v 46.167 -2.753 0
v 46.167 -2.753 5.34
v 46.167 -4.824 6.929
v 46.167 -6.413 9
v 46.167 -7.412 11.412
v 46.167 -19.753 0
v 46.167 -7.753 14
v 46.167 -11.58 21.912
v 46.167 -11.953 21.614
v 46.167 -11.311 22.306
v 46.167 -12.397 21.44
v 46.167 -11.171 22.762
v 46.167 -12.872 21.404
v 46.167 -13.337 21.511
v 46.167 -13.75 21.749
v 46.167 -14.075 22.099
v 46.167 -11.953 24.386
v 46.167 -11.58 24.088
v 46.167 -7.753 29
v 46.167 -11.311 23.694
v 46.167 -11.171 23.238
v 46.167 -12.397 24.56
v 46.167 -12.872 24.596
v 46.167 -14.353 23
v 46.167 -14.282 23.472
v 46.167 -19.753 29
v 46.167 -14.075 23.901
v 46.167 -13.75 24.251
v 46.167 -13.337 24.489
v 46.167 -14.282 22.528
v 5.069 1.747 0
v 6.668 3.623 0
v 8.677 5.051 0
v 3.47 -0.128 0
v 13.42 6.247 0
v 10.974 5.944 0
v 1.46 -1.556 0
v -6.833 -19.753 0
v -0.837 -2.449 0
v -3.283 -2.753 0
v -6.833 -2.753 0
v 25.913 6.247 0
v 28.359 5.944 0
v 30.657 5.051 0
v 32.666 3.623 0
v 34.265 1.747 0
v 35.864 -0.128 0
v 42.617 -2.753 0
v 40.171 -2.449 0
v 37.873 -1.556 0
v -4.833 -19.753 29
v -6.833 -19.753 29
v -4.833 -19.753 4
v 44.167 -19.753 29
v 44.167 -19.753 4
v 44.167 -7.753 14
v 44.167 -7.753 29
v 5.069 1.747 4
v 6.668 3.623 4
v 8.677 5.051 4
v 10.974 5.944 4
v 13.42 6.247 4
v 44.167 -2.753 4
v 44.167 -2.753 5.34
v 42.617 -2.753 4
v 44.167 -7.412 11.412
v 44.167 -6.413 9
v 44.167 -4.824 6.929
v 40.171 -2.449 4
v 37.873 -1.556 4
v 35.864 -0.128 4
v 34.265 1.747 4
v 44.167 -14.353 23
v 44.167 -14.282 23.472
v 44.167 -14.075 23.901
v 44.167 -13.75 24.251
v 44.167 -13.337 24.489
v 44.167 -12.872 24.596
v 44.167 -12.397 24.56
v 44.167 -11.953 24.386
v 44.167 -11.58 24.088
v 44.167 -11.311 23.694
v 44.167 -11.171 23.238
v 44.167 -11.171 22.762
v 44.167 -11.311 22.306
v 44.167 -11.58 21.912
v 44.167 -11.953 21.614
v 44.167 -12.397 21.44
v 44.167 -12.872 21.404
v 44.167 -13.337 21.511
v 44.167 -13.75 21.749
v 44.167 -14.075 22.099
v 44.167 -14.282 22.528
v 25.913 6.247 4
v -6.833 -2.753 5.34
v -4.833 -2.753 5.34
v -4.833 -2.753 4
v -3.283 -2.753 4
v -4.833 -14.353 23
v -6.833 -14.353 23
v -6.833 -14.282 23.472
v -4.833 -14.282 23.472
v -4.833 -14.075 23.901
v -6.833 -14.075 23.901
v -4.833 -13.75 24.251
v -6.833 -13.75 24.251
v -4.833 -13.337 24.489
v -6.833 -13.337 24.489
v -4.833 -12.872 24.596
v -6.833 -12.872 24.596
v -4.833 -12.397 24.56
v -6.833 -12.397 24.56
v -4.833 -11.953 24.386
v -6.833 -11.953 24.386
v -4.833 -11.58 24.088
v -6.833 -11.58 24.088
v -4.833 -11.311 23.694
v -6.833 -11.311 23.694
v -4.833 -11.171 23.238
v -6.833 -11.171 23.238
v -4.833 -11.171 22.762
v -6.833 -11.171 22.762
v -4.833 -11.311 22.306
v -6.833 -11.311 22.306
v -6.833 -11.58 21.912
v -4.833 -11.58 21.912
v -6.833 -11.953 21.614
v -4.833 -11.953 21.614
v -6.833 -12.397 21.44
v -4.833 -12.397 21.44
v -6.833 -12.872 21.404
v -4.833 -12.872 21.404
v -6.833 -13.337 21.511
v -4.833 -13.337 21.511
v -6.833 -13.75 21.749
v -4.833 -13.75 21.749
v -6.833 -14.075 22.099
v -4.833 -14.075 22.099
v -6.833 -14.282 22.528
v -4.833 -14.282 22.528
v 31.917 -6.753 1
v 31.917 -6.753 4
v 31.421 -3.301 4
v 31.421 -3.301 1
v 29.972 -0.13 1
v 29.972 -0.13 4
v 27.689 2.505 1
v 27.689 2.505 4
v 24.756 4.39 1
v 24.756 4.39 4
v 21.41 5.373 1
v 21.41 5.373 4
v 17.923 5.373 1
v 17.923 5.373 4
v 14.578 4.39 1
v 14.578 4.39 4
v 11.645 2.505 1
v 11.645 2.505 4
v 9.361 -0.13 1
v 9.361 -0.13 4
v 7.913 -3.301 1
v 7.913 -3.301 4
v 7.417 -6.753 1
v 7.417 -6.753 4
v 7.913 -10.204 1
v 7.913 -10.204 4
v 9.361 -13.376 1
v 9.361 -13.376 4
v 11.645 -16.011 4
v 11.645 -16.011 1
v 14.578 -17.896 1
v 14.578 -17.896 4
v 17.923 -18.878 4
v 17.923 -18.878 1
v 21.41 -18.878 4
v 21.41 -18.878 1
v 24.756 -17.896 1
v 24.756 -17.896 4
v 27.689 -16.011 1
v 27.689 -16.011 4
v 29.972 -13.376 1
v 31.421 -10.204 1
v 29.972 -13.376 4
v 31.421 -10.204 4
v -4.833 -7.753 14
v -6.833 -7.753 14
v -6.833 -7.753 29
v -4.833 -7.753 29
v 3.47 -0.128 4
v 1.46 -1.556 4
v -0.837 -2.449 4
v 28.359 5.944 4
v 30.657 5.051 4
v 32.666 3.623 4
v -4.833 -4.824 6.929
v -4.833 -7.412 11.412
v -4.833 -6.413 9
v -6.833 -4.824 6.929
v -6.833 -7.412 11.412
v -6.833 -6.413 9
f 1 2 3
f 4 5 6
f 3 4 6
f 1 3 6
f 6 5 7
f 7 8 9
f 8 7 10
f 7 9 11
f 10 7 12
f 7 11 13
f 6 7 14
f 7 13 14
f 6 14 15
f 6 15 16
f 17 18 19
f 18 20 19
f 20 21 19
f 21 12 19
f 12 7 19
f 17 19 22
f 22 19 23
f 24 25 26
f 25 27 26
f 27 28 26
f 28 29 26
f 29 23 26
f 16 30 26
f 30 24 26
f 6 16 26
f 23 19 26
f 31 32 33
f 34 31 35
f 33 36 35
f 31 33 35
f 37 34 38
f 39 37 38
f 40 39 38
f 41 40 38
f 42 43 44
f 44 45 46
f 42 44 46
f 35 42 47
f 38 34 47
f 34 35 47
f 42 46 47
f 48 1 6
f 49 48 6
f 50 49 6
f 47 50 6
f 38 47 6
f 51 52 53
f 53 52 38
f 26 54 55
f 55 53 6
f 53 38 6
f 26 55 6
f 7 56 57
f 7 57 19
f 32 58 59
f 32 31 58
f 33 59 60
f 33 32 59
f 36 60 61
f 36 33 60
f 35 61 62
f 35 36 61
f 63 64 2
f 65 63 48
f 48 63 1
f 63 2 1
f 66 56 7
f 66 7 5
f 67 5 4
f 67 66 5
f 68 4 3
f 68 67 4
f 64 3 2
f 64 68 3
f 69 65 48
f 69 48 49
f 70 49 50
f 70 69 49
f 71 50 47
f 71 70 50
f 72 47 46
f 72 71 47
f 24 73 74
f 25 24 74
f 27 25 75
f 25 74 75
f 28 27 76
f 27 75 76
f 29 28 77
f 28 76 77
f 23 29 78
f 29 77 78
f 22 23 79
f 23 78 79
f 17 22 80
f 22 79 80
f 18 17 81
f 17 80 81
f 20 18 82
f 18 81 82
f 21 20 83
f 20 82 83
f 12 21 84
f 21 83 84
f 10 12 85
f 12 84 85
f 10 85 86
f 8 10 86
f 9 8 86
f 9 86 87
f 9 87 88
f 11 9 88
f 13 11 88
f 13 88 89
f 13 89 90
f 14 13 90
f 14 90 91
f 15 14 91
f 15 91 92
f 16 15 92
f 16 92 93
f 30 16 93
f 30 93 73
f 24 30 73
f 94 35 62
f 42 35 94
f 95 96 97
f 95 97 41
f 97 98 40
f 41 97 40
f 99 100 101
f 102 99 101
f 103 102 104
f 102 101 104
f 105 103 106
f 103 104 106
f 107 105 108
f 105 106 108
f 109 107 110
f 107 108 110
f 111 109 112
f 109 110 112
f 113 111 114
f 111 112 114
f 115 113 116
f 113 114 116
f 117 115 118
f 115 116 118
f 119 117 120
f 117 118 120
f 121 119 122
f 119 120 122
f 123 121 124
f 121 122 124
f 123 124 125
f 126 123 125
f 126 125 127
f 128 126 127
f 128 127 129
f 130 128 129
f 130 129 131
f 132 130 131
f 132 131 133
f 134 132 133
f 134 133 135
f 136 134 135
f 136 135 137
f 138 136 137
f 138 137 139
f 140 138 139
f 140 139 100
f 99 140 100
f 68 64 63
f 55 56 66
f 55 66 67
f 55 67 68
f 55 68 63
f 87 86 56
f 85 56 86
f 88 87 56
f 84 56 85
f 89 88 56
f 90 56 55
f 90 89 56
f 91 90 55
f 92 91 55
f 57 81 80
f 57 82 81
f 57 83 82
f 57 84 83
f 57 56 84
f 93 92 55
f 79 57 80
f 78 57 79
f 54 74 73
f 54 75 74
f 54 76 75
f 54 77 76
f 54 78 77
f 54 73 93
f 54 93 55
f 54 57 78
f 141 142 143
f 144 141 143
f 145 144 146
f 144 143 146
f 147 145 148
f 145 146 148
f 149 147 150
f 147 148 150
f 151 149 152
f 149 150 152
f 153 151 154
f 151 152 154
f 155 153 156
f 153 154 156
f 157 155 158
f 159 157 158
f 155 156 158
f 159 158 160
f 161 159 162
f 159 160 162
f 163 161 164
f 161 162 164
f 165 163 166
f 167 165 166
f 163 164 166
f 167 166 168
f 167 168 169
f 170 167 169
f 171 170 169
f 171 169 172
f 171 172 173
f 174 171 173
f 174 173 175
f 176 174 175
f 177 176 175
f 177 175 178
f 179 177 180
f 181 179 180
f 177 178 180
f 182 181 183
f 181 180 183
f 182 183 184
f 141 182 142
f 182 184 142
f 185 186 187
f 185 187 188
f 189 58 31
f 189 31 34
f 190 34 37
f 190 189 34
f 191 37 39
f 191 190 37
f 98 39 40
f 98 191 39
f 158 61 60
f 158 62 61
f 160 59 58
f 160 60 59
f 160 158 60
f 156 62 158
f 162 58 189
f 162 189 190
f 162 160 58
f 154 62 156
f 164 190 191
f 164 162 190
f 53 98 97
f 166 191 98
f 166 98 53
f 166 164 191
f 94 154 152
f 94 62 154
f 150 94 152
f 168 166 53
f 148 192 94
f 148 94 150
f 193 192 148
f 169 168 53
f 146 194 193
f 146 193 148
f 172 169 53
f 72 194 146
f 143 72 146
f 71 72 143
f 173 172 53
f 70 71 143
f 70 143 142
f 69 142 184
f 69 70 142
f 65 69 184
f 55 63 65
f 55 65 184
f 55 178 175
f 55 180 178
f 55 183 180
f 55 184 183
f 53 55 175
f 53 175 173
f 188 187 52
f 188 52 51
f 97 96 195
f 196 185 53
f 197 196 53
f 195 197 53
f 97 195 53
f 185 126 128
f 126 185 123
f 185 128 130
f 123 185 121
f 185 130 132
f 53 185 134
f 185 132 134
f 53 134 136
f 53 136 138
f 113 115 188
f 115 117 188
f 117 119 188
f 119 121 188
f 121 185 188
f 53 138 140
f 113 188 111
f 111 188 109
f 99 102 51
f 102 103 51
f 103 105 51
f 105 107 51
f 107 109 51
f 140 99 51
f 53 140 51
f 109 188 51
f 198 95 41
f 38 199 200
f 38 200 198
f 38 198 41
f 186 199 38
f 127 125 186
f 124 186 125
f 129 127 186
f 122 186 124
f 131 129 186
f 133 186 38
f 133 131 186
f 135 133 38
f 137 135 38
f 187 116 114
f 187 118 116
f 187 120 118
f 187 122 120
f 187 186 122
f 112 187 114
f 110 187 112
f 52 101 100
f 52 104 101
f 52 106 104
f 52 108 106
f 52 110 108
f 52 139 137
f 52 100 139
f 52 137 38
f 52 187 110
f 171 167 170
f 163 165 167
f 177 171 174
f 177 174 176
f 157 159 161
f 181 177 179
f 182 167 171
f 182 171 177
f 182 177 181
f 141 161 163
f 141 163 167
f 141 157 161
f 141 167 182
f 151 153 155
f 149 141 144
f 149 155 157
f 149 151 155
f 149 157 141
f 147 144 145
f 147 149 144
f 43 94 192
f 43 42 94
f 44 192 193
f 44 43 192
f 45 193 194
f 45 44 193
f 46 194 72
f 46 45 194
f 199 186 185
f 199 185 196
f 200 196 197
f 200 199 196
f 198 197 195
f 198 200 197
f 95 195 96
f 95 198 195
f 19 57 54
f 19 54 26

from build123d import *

# Parameters (mm, degrees)
SKETCH1_W           = 53
SKETCH1_H           = 26
BOSS_EXTRUDE2_DEPTH = 4
SKETCH3_R           = 12.25
CUT_EXTRUDE2_DEPTH  = 3
CUT_EXTRUDE3_REACH  = 52.374
SKETCH4_W           = 13.5
SKETCH4_H           = 9
FILLET1_R           = 10
FILLET2_R           = 10
SKETCH5_W           = 2
SKETCH5_H           = 12
BOSS_EXTRUDE3_DEPTH = 25
SKETCH6_R           = 1.6
CUT_EXTRUDE4_DEPTH  = 64.562322282
FILLET3_R           = 10


with BuildPart() as part:
    # Sketch1 → Boss-Extrude2 (new body)
    with BuildSketch(Plane.XY):
        with Locations((19.666835682, -6.752691308)):
            Rectangle(SKETCH1_W, SKETCH1_H)
    extrude(amount=BOSS_EXTRUDE2_DEPTH)

    # Sketch3 → Cut-Extrude2 (cut)
    with BuildSketch(Plane.XY.offset(4)):
        with Locations((19.666835682, -6.752691308)):
            Circle(SKETCH3_R)
    extrude(amount=-CUT_EXTRUDE2_DEPTH, mode=Mode.SUBTRACT)

    # Sketch4 → Cut-Extrude3 (cut, up to next)
    with BuildSketch(Plane.XY.offset(4), mode=Mode.PRIVATE) as cut_extrude3_sk1:
        with Locations((-0.083164318, 1.747308692)):
            Rectangle(SKETCH4_W, SKETCH4_H)
    cut_extrude3_tool1 = extrude(cut_extrude3_sk1.sketch, amount=-CUT_EXTRUDE3_REACH, mode=Mode.PRIVATE) & part.part
    # Sketch4 → Cut-Extrude3 (cut, up to next)
    with BuildSketch(Plane.XY.offset(4), mode=Mode.PRIVATE) as cut_extrude3_sk2:
        with Locations((39.416835682, 1.747308692)):
            Rectangle(SKETCH4_W, SKETCH4_H)
    cut_extrude3_tool2 = extrude(cut_extrude3_sk2.sketch, amount=-CUT_EXTRUDE3_REACH, mode=Mode.PRIVATE) & part.part
    add(cut_extrude3_tool1.solids().sort_by_distance((-0.083164, 1.747309, 4))[0], mode=Mode.SUBTRACT)
    add(cut_extrude3_tool2.solids().sort_by_distance((39.416836, 1.747309, 4))[0], mode=Mode.SUBTRACT)

    # Fillet1
    # the kernel refuses this fillet: 10 mm, written as the material it adds along each edge
    with BuildSketch(Plane(origin=(32.666835682, -2.752691308, 4), x_dir=(0, 1, 0), z_dir=(0, 0, -1))) as fillet1_piece_1:
        with BuildLine():
            CenterArc((10, 9.949874371), FILLET1_R, 180, 84.260829523)
            Line((0, 9.949874371), (-0.2, 9.949874371))
            Line((-0.2, 9.949874371), (-0.2, 0))
            Line((-0.2, 0), (0, -0.2))
            ThreePointArc((0, -0.2), (4.5, -0.2), (8.98, -0.198997487))
            Line((8.98, -0.198997487), (9, 0))
        make_face()
    extrude(amount=4)
    with BuildSketch(Plane(origin=(6.666835682, -2.752691308, 4), x_dir=(0, 1, 0), z_dir=(0, 0, -1))) as fillet1_piece_2:
        with BuildLine():
            CenterArc((10, -9.949874371), FILLET1_R, 95.739170477, 84.260829523)
            Line((0, -9.949874371), (-0.2, -9.949874371))
            Line((-0.2, -9.949874371), (-0.2, 0))
            Line((-0.2, 0), (0, 0.2))
            ThreePointArc((0, 0.2), (4.5, 0.2), (8.98, 0.198997487))
            Line((8.98, 0.198997487), (9, 0))
        make_face()
    extrude(amount=4)

    # Fillet2
    fillet2_edges = [part.edges().sort_by_distance(p)[0] for p in [
        (6.666835682, 6.247308692, 2),
        (32.666835682, 6.247308692, 2),
    ]]
    fillet(fillet2_edges, radius=FILLET2_R)

    # Sketch5 → Boss-Extrude3 (add)
    with BuildSketch(Plane.XY.offset(4)):
        with Locations((-5.833164318, -13.752691308)):
            Rectangle(SKETCH5_W, SKETCH5_H)
        with Locations((45.166835682, -13.752691308)):
            Rectangle(SKETCH5_W, SKETCH5_H)
    extrude(amount=BOSS_EXTRUDE3_DEPTH)

    # Sketch6 → Cut-Extrude4 (cut, through all)
    with BuildSketch(Plane.ZY.offset(6.833164318)):
        with Locations(Location((23, -12.752691308, 0), (0, 0, 270))):
            Circle(SKETCH6_R)
    extrude(amount=-CUT_EXTRUDE4_DEPTH, mode=Mode.SUBTRACT)

    # Fillet3
    # the kernel refuses this fillet: 10 mm, written as the material it adds along each edge
    with BuildSketch(Plane(origin=(44.166835682, -7.752691308, 4), x_dir=(0, 1, 0), z_dir=(1, 0, 0))) as fillet3_piece_1_section:
        with BuildLine():
            CenterArc((FILLET3_R, FILLET3_R), FILLET3_R, 180, 90)
            Line((0, FILLET3_R), (0, 0))
            Line((0, 0), (FILLET3_R, 0))
        make_face()
    fillet3_piece_1 = extrude(amount=2, mode=Mode.PRIVATE)
    fillet3_piece_1 = split(fillet3_piece_1, bisect_by=Plane(origin=(45.166835682, -2.752691308, 6.440248494), z_dir=(0, -1, 0)), keep=Keep.TOP, mode=Mode.PRIVATE)
    add(fillet3_piece_1)
    with BuildSketch(Plane(origin=(-6.833164318, -7.752691308, 4), x_dir=(0, 1, 0), z_dir=(1, 0, 0))) as fillet3_piece_2_section:
        with BuildLine():
            CenterArc((FILLET3_R, FILLET3_R), FILLET3_R, 180, 90)
            Line((0, FILLET3_R), (0, 0))
            Line((0, 0), (FILLET3_R, 0))
        make_face()
    fillet3_piece_2 = extrude(amount=2, mode=Mode.PRIVATE)
    fillet3_piece_2 = split(fillet3_piece_2, bisect_by=Plane(origin=(-5.833164318, -2.752691308, 6.440248494), z_dir=(0, -1, 0)), keep=Keep.TOP, mode=Mode.PRIVATE)
    add(fillet3_piece_2)


solid = part.part
